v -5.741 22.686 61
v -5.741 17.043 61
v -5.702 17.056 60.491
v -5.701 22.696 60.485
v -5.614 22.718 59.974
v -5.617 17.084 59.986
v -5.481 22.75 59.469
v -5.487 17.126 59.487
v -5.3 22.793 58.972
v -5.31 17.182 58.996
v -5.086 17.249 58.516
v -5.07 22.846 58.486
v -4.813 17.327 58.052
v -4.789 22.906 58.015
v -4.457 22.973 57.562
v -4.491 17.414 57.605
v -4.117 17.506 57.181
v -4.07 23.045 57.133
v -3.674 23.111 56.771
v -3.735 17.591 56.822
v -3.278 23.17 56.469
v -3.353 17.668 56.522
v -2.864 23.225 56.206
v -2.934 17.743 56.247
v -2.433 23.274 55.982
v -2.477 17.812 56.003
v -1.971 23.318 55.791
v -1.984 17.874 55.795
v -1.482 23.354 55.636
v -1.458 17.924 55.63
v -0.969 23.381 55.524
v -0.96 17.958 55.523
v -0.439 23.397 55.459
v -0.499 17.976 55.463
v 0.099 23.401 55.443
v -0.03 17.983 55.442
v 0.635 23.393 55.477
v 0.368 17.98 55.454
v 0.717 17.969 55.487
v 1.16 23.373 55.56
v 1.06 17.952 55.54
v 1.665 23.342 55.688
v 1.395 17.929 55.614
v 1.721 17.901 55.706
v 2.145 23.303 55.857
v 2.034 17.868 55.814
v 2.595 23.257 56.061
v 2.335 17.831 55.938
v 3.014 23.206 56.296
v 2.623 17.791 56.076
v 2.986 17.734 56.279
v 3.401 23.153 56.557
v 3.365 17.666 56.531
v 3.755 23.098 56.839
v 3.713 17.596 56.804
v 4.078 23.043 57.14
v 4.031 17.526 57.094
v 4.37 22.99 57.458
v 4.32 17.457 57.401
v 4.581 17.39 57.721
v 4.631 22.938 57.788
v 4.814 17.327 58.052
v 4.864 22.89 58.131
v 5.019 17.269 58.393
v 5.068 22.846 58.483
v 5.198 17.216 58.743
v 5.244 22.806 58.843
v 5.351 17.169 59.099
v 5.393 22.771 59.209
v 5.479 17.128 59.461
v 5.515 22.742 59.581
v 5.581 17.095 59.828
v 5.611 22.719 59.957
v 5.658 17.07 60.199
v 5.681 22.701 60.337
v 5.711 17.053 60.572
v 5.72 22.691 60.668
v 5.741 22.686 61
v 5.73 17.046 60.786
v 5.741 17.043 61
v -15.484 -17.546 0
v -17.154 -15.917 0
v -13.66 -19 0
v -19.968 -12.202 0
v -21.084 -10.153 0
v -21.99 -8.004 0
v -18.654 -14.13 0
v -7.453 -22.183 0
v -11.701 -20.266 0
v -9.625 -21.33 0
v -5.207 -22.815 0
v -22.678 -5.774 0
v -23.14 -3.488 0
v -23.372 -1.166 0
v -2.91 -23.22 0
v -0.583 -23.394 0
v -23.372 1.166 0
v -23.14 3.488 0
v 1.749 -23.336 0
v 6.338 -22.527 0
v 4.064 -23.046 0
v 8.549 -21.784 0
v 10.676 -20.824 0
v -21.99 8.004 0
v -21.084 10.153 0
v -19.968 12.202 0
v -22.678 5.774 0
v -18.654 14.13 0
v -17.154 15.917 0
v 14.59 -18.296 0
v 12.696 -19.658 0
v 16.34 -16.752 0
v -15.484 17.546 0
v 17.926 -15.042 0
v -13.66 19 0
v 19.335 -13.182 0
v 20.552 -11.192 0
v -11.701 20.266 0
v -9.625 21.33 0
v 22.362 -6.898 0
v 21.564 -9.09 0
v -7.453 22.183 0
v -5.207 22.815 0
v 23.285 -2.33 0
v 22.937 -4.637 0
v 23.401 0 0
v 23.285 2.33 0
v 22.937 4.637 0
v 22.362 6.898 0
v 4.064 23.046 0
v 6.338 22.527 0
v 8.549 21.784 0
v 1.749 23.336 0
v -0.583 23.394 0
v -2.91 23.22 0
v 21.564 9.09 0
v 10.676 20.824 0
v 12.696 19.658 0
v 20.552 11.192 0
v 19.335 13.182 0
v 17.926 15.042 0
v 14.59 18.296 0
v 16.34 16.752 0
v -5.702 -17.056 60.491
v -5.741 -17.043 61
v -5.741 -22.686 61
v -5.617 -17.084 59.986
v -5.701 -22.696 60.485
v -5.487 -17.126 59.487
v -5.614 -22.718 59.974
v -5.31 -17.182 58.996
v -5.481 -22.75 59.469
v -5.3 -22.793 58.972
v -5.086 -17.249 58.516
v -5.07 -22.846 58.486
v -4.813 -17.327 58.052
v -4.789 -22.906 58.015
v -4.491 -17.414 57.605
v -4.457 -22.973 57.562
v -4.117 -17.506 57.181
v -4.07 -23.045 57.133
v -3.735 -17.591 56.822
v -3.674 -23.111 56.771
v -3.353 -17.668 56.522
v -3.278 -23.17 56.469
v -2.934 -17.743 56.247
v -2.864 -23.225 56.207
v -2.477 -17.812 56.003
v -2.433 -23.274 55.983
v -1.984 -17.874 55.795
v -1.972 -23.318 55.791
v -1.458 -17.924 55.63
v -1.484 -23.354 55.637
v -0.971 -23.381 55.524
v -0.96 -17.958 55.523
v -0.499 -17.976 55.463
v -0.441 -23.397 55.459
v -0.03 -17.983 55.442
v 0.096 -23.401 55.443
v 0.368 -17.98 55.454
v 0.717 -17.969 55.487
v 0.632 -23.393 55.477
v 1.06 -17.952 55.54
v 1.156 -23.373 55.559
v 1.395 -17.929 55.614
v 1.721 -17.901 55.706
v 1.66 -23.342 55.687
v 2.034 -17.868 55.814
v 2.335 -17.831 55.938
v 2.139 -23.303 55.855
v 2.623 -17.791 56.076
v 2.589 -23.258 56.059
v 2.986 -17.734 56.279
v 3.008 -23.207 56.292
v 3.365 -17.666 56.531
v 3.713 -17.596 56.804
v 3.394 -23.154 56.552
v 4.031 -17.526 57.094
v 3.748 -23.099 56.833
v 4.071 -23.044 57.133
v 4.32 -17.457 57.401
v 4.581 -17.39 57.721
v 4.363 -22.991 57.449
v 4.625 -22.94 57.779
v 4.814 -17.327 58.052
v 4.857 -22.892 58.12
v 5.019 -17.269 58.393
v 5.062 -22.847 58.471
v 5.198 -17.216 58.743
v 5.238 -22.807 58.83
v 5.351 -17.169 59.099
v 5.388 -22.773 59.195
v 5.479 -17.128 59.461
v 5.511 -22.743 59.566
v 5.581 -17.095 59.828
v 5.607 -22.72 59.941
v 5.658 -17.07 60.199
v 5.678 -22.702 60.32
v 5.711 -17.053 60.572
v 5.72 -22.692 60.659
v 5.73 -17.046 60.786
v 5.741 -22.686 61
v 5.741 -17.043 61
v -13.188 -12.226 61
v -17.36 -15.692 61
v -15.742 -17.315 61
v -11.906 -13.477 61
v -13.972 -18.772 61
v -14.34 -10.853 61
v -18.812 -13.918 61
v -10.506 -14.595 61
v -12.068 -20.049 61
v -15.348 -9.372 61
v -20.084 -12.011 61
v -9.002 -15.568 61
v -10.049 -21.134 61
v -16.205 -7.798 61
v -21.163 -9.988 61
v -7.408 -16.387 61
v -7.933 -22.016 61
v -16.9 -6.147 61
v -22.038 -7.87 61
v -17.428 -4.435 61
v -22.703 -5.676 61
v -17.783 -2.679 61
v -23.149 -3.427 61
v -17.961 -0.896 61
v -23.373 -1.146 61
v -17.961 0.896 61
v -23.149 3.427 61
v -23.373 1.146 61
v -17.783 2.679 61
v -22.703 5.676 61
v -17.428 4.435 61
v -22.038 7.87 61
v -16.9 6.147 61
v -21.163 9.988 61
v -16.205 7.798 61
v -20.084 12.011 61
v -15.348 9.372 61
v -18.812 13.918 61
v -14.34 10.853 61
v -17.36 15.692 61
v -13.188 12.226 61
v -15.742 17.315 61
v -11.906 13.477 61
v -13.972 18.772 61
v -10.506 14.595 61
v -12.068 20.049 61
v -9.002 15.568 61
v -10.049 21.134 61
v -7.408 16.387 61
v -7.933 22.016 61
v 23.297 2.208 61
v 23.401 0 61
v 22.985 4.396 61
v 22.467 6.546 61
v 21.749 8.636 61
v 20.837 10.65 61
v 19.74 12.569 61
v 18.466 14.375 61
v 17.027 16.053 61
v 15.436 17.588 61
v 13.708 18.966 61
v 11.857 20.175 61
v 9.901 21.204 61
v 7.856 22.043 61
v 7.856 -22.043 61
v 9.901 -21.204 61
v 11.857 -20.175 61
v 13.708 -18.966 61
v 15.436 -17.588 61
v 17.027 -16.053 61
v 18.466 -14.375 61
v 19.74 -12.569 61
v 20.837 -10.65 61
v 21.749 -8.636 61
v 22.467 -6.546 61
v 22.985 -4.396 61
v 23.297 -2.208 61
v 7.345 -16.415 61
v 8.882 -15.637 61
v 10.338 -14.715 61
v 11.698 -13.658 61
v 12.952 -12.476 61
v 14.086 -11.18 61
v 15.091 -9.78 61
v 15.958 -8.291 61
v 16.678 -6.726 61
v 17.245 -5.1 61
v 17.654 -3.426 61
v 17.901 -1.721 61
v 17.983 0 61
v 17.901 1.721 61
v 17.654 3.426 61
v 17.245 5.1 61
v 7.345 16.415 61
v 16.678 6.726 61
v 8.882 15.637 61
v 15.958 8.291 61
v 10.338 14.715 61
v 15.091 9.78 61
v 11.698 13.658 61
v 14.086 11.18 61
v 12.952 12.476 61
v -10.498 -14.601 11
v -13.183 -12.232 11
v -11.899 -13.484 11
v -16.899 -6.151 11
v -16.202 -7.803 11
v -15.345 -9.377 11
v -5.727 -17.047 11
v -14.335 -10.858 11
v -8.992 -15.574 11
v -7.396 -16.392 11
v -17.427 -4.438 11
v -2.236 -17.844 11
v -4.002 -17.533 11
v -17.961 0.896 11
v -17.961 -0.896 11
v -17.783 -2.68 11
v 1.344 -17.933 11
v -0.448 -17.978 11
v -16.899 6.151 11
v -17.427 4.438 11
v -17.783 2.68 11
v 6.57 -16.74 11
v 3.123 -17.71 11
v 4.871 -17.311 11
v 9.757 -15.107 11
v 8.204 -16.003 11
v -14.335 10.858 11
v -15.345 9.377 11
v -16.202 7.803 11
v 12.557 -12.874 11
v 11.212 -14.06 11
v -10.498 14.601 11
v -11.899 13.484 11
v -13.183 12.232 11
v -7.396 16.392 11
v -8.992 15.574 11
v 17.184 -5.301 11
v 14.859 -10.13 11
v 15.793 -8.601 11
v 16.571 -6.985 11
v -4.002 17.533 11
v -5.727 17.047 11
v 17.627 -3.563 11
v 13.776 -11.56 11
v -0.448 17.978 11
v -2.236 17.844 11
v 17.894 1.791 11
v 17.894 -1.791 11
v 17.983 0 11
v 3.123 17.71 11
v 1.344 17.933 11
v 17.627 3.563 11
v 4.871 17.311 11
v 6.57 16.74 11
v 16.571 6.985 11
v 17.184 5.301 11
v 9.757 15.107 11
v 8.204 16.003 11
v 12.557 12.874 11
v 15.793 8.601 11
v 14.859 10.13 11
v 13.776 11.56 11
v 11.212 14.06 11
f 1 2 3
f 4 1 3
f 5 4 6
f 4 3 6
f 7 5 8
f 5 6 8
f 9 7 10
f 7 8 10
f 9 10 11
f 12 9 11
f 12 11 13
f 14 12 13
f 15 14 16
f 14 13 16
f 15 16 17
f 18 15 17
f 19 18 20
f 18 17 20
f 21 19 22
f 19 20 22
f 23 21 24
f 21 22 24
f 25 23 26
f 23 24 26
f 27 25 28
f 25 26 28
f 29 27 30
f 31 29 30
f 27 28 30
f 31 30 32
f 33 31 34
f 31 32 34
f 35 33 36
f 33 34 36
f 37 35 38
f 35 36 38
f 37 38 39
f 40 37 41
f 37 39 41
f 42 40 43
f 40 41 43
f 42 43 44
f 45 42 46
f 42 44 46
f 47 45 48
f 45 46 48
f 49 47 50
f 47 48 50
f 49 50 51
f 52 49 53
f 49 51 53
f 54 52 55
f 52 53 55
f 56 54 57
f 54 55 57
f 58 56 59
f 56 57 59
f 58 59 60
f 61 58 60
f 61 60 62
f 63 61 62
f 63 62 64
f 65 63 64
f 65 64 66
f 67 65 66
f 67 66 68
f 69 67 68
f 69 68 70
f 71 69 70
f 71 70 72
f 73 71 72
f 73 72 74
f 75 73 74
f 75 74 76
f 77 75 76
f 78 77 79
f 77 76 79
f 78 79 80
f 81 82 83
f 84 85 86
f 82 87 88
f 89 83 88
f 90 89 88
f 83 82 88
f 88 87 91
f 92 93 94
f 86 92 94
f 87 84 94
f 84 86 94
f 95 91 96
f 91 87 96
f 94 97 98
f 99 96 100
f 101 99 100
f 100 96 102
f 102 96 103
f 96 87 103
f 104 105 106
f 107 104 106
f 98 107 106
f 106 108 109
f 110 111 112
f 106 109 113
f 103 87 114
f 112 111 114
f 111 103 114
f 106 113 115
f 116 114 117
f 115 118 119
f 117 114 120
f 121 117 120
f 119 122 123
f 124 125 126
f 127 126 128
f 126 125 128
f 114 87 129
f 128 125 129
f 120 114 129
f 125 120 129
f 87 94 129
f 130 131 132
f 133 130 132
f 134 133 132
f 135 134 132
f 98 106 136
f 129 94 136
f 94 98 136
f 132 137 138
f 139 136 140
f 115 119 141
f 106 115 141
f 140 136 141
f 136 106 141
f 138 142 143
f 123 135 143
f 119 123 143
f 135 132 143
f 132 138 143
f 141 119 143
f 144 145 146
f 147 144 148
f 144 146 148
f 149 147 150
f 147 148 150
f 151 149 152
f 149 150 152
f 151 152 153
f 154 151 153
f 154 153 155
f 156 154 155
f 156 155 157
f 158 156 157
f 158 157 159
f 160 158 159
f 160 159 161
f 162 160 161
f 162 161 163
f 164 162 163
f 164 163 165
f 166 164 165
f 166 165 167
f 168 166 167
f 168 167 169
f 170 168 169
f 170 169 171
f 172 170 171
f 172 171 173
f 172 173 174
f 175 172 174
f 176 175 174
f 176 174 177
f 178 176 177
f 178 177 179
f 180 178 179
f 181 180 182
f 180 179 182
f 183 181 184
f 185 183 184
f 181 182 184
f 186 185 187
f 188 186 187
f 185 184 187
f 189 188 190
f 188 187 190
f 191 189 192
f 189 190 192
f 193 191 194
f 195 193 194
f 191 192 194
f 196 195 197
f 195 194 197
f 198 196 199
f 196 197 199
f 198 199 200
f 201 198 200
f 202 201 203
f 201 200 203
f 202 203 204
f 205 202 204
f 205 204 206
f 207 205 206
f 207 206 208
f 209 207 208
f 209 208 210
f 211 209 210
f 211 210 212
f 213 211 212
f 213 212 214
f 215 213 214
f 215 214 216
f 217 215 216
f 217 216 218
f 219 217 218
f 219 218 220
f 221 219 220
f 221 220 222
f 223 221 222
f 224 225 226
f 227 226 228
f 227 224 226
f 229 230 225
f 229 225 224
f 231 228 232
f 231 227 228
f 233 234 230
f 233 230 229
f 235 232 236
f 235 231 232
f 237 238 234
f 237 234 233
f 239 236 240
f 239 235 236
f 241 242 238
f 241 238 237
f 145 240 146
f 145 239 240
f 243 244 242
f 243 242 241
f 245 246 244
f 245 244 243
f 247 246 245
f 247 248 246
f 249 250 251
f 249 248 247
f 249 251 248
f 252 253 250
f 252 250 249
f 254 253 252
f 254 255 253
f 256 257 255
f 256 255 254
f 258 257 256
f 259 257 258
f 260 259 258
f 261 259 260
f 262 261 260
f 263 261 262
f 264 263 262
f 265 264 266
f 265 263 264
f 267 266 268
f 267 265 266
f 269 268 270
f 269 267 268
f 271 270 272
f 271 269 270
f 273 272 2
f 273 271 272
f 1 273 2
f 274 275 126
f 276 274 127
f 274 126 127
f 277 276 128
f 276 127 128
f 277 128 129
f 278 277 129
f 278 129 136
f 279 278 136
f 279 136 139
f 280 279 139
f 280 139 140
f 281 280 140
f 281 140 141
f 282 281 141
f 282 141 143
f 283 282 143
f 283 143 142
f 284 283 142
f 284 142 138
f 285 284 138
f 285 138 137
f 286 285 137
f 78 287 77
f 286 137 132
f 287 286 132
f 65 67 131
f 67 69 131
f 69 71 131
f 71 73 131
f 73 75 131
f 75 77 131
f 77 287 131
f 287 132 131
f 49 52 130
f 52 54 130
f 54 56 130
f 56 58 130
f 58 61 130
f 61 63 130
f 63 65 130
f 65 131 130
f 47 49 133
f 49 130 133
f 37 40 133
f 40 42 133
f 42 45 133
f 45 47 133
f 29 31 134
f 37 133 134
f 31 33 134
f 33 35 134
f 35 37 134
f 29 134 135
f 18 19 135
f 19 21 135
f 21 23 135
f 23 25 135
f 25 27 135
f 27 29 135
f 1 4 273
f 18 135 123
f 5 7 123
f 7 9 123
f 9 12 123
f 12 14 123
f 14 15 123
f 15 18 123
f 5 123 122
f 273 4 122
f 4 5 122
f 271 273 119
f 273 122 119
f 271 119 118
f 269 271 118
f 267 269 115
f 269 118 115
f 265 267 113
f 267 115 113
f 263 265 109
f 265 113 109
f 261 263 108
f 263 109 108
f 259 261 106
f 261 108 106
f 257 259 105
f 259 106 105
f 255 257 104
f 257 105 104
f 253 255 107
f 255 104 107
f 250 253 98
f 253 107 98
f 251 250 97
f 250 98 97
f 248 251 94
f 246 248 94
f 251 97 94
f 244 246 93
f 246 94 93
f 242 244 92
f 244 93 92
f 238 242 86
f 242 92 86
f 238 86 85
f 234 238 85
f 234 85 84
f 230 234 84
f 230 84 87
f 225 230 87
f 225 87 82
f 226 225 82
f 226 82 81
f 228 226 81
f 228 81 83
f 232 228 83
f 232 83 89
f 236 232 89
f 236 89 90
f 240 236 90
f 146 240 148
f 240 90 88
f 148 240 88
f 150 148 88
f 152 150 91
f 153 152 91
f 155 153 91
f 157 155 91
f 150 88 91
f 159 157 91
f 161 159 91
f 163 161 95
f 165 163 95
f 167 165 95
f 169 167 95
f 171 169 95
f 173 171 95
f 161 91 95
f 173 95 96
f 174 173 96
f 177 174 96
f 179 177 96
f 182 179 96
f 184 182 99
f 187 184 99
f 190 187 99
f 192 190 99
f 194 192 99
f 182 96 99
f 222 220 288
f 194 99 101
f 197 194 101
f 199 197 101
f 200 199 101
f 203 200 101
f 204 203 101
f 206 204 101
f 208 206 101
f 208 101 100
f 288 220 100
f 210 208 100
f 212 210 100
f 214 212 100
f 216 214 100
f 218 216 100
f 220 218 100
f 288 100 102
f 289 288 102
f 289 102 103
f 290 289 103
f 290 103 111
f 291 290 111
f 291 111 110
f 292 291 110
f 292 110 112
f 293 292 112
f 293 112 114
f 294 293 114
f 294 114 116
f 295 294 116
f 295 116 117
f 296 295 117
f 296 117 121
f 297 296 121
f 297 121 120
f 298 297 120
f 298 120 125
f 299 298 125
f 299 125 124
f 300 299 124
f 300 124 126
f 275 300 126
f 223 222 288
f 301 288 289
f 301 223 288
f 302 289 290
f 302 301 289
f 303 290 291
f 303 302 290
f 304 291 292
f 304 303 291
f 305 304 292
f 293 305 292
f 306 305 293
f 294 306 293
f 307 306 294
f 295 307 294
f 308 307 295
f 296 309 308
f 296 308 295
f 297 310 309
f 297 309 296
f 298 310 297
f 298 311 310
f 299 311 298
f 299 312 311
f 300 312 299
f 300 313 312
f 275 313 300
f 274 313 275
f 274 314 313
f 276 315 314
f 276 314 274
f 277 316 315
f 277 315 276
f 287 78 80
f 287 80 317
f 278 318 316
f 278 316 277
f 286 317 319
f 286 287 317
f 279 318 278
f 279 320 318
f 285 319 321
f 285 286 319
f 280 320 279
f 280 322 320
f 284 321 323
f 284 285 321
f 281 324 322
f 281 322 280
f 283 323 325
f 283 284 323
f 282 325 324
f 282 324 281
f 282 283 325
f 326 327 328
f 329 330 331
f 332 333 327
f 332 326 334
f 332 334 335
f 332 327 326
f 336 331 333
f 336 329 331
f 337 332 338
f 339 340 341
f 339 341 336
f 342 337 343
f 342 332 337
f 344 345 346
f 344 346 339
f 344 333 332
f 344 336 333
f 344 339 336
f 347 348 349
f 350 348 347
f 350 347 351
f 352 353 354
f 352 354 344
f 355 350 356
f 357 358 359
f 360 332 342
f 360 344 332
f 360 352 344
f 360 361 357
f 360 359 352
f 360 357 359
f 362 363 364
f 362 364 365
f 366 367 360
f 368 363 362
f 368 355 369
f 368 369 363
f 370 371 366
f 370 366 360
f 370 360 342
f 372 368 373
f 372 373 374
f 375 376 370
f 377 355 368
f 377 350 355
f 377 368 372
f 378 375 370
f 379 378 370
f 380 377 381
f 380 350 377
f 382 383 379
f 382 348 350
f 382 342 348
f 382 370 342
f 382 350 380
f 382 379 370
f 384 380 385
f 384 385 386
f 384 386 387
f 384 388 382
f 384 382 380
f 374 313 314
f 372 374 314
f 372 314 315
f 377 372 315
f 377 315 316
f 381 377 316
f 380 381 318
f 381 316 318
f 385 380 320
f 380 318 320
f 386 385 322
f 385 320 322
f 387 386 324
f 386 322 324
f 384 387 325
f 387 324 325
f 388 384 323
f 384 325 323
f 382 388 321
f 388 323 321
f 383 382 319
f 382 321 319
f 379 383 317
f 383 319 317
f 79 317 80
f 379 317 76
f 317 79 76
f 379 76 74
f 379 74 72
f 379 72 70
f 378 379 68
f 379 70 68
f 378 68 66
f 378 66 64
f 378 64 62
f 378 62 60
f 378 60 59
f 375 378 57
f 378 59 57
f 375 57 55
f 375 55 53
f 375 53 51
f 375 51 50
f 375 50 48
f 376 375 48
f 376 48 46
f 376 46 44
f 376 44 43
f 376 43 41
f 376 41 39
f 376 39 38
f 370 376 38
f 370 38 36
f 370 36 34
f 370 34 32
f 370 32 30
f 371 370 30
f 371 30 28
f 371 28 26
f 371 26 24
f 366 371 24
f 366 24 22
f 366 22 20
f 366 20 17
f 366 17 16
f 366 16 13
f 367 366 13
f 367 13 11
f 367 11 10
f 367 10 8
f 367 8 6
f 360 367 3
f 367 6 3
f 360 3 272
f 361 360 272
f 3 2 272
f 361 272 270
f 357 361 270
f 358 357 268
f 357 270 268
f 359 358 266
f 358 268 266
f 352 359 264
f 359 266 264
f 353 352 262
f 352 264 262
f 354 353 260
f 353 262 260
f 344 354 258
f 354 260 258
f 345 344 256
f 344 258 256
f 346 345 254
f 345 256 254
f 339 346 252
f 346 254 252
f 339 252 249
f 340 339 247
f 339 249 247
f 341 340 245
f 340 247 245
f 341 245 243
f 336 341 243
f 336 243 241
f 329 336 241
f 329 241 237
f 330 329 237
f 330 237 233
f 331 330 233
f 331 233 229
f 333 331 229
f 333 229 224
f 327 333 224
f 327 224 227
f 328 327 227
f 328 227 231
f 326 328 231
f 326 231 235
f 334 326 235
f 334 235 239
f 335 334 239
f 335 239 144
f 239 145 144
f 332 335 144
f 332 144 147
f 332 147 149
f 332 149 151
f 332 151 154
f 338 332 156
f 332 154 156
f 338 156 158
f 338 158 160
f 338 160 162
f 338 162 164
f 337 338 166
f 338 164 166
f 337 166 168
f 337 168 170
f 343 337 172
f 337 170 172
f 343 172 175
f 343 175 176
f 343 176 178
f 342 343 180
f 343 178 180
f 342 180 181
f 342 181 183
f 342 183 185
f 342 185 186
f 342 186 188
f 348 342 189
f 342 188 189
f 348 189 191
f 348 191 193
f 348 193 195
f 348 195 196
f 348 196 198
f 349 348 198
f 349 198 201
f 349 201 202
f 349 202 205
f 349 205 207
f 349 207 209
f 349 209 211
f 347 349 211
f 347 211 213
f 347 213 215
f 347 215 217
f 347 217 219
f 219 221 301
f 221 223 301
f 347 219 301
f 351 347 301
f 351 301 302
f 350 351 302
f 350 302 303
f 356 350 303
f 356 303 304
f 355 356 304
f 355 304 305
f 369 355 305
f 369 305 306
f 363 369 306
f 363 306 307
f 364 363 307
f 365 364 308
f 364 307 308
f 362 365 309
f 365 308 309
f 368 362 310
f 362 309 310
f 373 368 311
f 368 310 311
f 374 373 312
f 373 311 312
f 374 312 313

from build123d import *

# Parameters (mm, degrees)
F0_R     = 23.401279
F1_DEPTH = 61
F3_R     = 17.983402
F4_DEPTH = 50
F6_R     = 5.743652
F7_DEPTH = 63.5


with BuildPart() as f1:
    # F0 (on Top) → F1 (new body)
    with BuildSketch(Plane.XY):
        Circle(F0_R)
    extrude(amount=F1_DEPTH)

    # F3 (on offset) → F4 (cut)
    with BuildSketch(Plane.XY.offset(61)):
        Circle(F3_R)
    extrude(amount=-F4_DEPTH, mode=Mode.SUBTRACT)

    # F6 (on offset) → F7 (cut)
    with BuildSketch(Plane.XZ.offset(25)):
        with Locations((0, 61.185386)):
            Circle(F6_R)
    extrude(amount=-F7_DEPTH, mode=Mode.SUBTRACT)


solid = f1.part
